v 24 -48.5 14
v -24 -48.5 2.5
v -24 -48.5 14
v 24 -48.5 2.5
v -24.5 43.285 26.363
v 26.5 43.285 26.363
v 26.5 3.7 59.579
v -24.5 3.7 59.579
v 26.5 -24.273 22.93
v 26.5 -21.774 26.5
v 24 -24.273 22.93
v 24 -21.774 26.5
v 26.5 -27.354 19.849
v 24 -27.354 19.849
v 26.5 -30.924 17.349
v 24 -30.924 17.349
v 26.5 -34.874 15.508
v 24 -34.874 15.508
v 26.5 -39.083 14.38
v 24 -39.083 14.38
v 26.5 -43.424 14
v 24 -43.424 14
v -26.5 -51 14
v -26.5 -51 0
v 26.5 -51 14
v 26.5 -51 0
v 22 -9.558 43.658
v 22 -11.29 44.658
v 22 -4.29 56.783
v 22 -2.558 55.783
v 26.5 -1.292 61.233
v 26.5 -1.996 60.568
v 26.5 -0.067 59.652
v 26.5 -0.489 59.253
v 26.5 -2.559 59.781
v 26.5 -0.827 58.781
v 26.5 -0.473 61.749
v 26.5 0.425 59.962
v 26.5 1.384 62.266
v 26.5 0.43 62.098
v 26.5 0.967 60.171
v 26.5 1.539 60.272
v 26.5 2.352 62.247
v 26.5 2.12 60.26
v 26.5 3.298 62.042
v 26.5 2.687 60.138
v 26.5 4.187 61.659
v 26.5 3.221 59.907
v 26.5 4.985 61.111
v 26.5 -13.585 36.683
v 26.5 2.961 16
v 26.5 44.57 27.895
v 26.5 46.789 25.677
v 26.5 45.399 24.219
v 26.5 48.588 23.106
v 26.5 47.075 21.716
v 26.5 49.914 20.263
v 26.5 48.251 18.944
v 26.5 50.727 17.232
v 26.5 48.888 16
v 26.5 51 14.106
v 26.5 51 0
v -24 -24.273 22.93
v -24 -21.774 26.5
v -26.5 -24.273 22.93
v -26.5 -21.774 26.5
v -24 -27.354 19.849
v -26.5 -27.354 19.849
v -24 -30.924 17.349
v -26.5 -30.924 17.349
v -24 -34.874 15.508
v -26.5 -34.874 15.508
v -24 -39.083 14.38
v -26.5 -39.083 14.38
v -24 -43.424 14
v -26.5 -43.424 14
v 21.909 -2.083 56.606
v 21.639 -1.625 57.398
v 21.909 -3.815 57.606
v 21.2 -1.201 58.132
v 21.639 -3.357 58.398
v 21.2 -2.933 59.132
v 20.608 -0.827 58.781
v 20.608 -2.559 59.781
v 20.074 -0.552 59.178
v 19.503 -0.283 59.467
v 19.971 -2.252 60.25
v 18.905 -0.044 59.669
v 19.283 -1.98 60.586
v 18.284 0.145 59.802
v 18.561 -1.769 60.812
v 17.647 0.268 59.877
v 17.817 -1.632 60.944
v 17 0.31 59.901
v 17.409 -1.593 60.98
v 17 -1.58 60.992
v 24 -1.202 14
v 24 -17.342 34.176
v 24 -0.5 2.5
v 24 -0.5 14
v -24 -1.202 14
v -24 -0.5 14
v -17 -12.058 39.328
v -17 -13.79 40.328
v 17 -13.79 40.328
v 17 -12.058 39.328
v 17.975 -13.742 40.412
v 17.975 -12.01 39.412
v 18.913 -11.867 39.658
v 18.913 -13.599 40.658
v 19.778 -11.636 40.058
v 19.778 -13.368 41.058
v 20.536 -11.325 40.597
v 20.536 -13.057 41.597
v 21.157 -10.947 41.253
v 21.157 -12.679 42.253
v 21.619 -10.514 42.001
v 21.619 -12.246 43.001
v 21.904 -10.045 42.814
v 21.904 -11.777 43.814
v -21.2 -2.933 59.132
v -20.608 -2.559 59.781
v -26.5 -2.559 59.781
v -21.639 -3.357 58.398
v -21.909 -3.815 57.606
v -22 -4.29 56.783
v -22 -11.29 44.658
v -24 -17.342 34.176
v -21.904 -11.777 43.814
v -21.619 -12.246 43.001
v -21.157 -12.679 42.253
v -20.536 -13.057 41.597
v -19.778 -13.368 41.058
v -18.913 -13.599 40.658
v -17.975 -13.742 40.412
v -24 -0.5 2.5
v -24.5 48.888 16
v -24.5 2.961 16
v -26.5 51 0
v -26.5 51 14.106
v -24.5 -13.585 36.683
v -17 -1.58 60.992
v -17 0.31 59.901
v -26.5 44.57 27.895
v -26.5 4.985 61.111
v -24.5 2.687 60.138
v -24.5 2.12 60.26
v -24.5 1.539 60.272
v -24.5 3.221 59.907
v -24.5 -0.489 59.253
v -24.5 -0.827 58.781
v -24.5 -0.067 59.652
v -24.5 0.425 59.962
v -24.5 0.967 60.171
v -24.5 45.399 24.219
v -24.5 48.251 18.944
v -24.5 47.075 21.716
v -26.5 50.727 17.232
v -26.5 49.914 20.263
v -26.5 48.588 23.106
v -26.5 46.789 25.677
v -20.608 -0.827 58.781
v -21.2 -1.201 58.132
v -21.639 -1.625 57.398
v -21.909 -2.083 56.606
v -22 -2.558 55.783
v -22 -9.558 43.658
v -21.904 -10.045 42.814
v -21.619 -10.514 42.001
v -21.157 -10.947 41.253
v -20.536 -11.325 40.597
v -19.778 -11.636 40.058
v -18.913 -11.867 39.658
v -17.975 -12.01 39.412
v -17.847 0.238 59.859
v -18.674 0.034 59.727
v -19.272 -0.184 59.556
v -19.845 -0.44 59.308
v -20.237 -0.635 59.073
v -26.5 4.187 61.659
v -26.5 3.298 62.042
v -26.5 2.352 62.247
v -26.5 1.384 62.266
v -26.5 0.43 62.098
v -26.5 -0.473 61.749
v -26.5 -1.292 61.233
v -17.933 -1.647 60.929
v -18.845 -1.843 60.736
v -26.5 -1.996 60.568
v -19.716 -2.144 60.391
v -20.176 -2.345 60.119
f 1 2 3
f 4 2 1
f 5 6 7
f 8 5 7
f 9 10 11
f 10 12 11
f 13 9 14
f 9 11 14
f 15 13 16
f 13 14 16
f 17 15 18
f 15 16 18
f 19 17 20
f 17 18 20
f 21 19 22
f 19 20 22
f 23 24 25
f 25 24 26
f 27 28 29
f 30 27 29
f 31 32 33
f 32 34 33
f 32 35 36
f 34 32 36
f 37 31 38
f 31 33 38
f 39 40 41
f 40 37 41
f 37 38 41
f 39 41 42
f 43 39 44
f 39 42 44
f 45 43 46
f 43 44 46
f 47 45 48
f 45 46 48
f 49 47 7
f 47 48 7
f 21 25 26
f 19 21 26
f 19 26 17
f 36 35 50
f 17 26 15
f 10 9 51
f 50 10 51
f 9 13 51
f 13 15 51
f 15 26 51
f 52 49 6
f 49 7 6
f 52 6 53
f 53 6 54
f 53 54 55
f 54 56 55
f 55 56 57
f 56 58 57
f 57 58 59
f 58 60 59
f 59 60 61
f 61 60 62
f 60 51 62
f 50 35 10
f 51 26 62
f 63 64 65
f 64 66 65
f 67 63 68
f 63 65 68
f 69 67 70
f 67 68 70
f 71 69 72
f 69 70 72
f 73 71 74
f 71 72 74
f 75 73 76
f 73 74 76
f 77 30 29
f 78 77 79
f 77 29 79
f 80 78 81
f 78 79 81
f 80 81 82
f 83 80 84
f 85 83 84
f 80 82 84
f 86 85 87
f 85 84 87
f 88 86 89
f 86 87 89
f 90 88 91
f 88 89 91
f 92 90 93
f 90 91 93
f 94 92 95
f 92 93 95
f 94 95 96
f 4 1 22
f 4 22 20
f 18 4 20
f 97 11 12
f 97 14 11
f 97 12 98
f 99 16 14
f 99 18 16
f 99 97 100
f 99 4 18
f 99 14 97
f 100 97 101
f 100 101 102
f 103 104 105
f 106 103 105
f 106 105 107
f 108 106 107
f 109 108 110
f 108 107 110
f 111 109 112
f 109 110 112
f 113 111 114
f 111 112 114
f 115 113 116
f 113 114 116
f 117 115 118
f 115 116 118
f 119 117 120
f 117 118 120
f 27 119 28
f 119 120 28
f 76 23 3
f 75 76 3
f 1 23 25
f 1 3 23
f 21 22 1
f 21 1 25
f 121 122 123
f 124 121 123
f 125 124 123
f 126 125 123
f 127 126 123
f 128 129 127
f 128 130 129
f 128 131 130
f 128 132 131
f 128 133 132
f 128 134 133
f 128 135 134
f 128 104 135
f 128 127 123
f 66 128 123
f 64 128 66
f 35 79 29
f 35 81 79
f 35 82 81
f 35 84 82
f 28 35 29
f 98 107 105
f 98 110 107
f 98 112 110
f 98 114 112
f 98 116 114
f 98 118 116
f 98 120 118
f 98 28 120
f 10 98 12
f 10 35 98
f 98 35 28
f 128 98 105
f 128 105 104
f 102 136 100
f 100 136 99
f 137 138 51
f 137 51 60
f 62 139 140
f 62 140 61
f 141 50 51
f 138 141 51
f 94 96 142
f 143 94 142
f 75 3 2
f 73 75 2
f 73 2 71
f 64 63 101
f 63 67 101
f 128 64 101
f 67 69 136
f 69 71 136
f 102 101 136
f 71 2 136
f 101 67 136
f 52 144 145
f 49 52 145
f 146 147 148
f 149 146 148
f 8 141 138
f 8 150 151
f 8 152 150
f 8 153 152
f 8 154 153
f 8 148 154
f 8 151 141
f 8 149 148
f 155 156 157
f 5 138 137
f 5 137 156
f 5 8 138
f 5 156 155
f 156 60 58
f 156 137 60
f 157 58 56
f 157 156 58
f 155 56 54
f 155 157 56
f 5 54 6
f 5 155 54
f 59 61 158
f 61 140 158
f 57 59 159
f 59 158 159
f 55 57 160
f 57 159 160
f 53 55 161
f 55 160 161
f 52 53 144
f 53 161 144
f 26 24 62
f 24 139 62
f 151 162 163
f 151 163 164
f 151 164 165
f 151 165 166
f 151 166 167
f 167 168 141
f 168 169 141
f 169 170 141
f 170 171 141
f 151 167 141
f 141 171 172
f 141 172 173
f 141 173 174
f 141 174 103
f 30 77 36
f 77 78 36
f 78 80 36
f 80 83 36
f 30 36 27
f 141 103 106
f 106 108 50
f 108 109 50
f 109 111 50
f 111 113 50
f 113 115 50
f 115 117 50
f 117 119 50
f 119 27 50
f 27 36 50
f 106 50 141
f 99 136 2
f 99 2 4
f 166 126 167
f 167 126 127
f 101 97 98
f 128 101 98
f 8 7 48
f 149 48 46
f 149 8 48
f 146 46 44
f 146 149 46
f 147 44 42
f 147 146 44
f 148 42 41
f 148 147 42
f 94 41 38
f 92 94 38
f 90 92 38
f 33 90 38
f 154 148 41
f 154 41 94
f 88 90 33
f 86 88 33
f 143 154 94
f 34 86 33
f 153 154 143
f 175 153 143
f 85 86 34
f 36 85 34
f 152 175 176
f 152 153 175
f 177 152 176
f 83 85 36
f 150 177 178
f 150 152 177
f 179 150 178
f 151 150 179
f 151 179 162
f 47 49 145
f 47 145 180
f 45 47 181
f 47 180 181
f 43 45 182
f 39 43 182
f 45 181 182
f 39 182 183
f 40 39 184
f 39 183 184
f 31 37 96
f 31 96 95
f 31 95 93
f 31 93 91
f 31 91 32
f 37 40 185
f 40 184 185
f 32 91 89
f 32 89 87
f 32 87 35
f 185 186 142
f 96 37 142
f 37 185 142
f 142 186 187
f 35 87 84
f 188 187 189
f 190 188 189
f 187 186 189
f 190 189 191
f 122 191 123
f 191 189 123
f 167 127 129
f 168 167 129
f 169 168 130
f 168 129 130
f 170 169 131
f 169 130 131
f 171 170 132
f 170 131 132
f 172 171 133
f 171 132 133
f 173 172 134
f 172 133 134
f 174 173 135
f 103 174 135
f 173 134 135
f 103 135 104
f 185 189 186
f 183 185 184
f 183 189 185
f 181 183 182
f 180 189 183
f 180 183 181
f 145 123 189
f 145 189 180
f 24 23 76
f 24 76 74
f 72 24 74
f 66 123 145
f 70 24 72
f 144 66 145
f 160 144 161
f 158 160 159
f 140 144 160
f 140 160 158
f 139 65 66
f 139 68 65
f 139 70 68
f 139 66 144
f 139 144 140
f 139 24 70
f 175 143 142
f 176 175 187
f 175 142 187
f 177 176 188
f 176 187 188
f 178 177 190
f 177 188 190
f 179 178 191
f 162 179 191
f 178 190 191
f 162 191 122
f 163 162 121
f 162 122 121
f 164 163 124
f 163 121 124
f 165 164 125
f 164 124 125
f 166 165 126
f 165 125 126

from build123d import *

# Parameters (mm, degrees)
F0_W      = 53
F0_H      = 53
F1_DEPTH  = 14
F0_H_2    = 49
F2_DEPTH  = 14
F3_T      = -2.5
F5_DEPTH  = 53
F6_DEPTH  = 53
F7_T      = -2.5
F9_R      = 18
F10_R     = 5
F11_T     = -2
F12_DEPTH = 7.2
F14_R     = 25


with BuildPart() as f1:
    # F0 (on Top) → F1 (new body)
    with BuildSketch(Plane.XY):
        with Locations((0, -24.5)):
            Rectangle(F0_W, F0_H)
    extrude(amount=F1_DEPTH)

    # F3
    f3_openings = [f1.faces().sort_by_distance(p)[0] for p in [
        (0, -24.5, 14),
    ]]
    offset(amount=F3_T, openings=f3_openings)


with BuildPart() as f2:
    # F0 (on Top) → F2 (new body)
    with BuildSketch(Plane.XY):
        with Locations((0, 26.5)):
            Rectangle(F0_W, F0_H_2)
    extrude(amount=F2_DEPTH)


with BuildPart() as f5:
    # F4 (on face) → F5 (new body, through all)
    with BuildSketch(Plane.YZ.offset(26.5)):
        Polygon((-16, 36.5), (2, 14), (51, 14), (51, 22.5), (0.4205387023, 64.94120732), align=None)
    extrude(amount=-F5_DEPTH)

    # F9
    f9_edges = [f5.edges().sort_by_distance(p)[0] for p in [
        (0, 51, 22.5),
    ]]
    fillet(f9_edges, radius=F9_R)

    # F10
    f10_edges = [f5.edges().sort_by_distance(p)[0] for p in [
        (0, 0.420539, 64.941207),
    ]]
    fillet(f10_edges, radius=F10_R)

    # F11
    f11_openings = [f5.faces().sort_by_distance(p)[0] for p in [
        (26.5, 14.357834, 32.967777),
    ]]
    offset(amount=F11_T, openings=f11_openings)

    # F8 (on face) → F12 (cut)
    with BuildSketch(Plane(origin=(0, -27.8049636191, 16.0532032303), x_dir=(1, 0, 0), z_dir=(0, -0.8660254038, 0.5))):
        with BuildLine():
            Line((17, 52.0304659404), (-17, 52.0304659404))
            ThreePointArc((-17, 52.0304659404), (-20.5355339059, 50.5659998464), (-22, 47.0304659404))
            Line((-22, 47.0304659404), (-22, 33.0304659404))
            ThreePointArc((-22, 33.0304659404), (-20.5355339059, 29.4949320345), (-17, 28.0304659404))
            Line((-17, 28.0304659404), (17, 28.0304659404))
            ThreePointArc((17, 28.0304659404), (20.5355339059, 29.4949320345), (22, 33.0304659404))
            Line((22, 33.0304659404), (22, 47.0304659404))
            ThreePointArc((22, 47.0304659404), (20.5355339059, 50.5659998464), (17, 52.0304659404))
        make_face()
    extrude(amount=-F12_DEPTH, mode=Mode.SUBTRACT)


with BuildPart() as f6:
    # F4 (on face) → F6 (new body, through all)
    with BuildSketch(Plane.YZ.offset(26.5)):
        Polygon((-16, 14), (2, 14), (-16, 36.5), align=None)
        Polygon((-16, 36.5), (-28.9903810568, 14), (-16, 14), align=None)
    extrude(amount=-F6_DEPTH)

    # F7
    f7_openings = [f6.faces().sort_by_distance(p)[0] for p in [
        (0, -22.495191, 25.25),
        (0, -13.495191, 14),
    ]]
    offset(amount=F7_T, openings=f7_openings)

    # F13: union F5, F2, F1
    add(f5.part)
    add(f2.part)
    add(f1.part)

    # F14
    f14_edges = [f6.edges().sort_by_distance(p)[0] for p in [
        (25.25, -28.990381, 14),
        (-25.25, -28.990381, 14),
    ]]
    fillet(f14_edges, radius=F14_R)


solid = f6.part
